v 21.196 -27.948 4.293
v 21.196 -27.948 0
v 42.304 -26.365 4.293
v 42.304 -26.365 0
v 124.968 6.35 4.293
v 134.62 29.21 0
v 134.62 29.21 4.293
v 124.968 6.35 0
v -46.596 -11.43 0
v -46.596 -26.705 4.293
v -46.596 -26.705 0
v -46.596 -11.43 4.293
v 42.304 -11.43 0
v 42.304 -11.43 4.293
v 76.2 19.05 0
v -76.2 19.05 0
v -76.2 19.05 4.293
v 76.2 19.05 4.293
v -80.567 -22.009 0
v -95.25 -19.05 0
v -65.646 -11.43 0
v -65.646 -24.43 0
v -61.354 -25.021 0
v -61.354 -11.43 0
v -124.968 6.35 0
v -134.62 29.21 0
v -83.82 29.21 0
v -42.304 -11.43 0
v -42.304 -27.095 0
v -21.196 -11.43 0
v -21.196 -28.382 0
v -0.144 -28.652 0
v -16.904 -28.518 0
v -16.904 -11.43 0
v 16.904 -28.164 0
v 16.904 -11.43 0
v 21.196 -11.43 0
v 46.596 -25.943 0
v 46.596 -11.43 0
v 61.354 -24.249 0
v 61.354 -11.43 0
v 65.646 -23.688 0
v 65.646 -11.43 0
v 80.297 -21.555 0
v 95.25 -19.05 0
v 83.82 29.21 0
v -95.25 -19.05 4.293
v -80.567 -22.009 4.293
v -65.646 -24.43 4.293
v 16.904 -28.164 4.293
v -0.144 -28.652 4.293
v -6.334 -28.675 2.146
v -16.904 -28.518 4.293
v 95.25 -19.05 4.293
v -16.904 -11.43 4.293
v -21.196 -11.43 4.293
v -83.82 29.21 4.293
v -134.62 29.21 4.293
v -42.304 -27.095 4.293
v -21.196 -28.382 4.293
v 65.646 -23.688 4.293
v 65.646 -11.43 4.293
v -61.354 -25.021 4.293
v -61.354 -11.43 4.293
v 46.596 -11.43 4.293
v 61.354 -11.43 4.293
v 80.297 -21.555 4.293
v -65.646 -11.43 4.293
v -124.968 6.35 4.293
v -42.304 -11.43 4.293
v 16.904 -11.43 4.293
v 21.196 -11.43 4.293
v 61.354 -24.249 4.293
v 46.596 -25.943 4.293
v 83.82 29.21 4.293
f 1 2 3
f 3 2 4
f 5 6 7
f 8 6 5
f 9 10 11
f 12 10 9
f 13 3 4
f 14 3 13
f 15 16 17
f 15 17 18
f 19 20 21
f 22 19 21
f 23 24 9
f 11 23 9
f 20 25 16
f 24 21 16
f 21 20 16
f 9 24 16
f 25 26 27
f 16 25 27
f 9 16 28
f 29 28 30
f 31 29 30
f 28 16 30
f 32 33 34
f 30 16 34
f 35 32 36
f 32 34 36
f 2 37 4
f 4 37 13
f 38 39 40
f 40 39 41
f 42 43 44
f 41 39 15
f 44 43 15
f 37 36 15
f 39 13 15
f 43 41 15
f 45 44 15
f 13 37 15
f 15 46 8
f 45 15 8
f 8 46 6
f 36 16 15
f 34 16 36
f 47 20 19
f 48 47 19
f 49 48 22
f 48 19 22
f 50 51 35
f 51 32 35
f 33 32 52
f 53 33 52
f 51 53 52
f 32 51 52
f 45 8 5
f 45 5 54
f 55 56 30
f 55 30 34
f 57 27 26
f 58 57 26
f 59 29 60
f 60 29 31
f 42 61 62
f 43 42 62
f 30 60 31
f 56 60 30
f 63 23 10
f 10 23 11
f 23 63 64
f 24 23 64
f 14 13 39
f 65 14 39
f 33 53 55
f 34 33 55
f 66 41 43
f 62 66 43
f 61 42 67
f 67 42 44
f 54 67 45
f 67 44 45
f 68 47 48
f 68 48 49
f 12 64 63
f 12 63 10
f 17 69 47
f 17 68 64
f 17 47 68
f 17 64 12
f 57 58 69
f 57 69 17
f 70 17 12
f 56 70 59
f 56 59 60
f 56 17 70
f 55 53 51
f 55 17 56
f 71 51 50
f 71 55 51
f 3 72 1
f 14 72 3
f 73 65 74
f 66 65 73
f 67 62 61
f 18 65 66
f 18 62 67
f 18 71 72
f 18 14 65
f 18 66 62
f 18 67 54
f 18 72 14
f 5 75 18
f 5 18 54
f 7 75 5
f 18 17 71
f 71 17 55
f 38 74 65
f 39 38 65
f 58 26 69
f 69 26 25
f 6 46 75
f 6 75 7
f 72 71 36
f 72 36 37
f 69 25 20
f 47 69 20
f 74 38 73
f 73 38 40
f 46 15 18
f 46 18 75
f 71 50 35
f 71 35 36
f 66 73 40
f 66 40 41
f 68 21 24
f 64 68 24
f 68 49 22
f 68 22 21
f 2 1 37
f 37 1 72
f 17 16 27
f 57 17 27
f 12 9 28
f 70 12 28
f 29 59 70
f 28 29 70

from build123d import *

# Parameters (mm, degrees)
SKETCH1_W           = 152.4
SKETCH1_H           = 38.1
BOSS_EXTRUDE1_DEPTH = 4.2926
SKETCH3_W           = 4.2926
SKETCH3_H           = 20.32
CUT_EXTRUDE2_DEPTH  = 4.2926


with BuildPart() as part:
    # Sketch1 → Boss-Extrude1 (new body)
    with BuildSketch(Plane.XY):
        Polygon((-83.82, 29.21), (-134.62, 29.21), (-124.968, 6.35), (-95.25, -19.05), (-76.2, -19.05), (-76.2, 19.05), align=None)
        Rectangle(SKETCH1_W, SKETCH1_H)
        with BuildLine():
            Line((-76.2, -19.05), (-95.25, -19.05))
            add(Edge.make_bspline(
                [(-95.25, -19.05), (-66.079235011, -25.514680938), (-2.12159074, -32.083739423), (61.761861898, -25.010246771), (95.25, -19.05)],
                knots=[0, 0, 0, 0, 0.467198678, 1, 1, 1, 1], degree=3))
            Line((95.25, -19.05), (76.2, -19.05))
            Line((76.2, -19.05), (-76.2, -19.05))
        make_face()
        Polygon((95.25, -19.05), (76.2, -19.05), (76.2, 19.05), (83.82, 29.21), (134.62, 29.21), (124.968, 6.35), align=None)
    extrude(amount=BOSS_EXTRUDE1_DEPTH)

    # Sketch3 → Cut-Extrude2 (cut)
    with BuildSketch(Plane.XY.offset(4.2926)):
        with Locations((-63.5, -21.59)):
            Rectangle(SKETCH3_W, SKETCH3_H)
        with Locations((-44.45, -21.59)):
            Rectangle(SKETCH3_W, SKETCH3_H)
        with Locations((-19.05, -21.59)):
            Rectangle(SKETCH3_W, SKETCH3_H)
        with Locations((44.45, -21.59)):
            Rectangle(SKETCH3_W, SKETCH3_H)
        with Locations((63.5, -21.59)):
            Rectangle(SKETCH3_W, SKETCH3_H)
        with Locations((19.05, -21.59)):
            Rectangle(SKETCH3_W, SKETCH3_H)
    extrude(amount=-CUT_EXTRUDE2_DEPTH, mode=Mode.SUBTRACT)


solid = part.part
